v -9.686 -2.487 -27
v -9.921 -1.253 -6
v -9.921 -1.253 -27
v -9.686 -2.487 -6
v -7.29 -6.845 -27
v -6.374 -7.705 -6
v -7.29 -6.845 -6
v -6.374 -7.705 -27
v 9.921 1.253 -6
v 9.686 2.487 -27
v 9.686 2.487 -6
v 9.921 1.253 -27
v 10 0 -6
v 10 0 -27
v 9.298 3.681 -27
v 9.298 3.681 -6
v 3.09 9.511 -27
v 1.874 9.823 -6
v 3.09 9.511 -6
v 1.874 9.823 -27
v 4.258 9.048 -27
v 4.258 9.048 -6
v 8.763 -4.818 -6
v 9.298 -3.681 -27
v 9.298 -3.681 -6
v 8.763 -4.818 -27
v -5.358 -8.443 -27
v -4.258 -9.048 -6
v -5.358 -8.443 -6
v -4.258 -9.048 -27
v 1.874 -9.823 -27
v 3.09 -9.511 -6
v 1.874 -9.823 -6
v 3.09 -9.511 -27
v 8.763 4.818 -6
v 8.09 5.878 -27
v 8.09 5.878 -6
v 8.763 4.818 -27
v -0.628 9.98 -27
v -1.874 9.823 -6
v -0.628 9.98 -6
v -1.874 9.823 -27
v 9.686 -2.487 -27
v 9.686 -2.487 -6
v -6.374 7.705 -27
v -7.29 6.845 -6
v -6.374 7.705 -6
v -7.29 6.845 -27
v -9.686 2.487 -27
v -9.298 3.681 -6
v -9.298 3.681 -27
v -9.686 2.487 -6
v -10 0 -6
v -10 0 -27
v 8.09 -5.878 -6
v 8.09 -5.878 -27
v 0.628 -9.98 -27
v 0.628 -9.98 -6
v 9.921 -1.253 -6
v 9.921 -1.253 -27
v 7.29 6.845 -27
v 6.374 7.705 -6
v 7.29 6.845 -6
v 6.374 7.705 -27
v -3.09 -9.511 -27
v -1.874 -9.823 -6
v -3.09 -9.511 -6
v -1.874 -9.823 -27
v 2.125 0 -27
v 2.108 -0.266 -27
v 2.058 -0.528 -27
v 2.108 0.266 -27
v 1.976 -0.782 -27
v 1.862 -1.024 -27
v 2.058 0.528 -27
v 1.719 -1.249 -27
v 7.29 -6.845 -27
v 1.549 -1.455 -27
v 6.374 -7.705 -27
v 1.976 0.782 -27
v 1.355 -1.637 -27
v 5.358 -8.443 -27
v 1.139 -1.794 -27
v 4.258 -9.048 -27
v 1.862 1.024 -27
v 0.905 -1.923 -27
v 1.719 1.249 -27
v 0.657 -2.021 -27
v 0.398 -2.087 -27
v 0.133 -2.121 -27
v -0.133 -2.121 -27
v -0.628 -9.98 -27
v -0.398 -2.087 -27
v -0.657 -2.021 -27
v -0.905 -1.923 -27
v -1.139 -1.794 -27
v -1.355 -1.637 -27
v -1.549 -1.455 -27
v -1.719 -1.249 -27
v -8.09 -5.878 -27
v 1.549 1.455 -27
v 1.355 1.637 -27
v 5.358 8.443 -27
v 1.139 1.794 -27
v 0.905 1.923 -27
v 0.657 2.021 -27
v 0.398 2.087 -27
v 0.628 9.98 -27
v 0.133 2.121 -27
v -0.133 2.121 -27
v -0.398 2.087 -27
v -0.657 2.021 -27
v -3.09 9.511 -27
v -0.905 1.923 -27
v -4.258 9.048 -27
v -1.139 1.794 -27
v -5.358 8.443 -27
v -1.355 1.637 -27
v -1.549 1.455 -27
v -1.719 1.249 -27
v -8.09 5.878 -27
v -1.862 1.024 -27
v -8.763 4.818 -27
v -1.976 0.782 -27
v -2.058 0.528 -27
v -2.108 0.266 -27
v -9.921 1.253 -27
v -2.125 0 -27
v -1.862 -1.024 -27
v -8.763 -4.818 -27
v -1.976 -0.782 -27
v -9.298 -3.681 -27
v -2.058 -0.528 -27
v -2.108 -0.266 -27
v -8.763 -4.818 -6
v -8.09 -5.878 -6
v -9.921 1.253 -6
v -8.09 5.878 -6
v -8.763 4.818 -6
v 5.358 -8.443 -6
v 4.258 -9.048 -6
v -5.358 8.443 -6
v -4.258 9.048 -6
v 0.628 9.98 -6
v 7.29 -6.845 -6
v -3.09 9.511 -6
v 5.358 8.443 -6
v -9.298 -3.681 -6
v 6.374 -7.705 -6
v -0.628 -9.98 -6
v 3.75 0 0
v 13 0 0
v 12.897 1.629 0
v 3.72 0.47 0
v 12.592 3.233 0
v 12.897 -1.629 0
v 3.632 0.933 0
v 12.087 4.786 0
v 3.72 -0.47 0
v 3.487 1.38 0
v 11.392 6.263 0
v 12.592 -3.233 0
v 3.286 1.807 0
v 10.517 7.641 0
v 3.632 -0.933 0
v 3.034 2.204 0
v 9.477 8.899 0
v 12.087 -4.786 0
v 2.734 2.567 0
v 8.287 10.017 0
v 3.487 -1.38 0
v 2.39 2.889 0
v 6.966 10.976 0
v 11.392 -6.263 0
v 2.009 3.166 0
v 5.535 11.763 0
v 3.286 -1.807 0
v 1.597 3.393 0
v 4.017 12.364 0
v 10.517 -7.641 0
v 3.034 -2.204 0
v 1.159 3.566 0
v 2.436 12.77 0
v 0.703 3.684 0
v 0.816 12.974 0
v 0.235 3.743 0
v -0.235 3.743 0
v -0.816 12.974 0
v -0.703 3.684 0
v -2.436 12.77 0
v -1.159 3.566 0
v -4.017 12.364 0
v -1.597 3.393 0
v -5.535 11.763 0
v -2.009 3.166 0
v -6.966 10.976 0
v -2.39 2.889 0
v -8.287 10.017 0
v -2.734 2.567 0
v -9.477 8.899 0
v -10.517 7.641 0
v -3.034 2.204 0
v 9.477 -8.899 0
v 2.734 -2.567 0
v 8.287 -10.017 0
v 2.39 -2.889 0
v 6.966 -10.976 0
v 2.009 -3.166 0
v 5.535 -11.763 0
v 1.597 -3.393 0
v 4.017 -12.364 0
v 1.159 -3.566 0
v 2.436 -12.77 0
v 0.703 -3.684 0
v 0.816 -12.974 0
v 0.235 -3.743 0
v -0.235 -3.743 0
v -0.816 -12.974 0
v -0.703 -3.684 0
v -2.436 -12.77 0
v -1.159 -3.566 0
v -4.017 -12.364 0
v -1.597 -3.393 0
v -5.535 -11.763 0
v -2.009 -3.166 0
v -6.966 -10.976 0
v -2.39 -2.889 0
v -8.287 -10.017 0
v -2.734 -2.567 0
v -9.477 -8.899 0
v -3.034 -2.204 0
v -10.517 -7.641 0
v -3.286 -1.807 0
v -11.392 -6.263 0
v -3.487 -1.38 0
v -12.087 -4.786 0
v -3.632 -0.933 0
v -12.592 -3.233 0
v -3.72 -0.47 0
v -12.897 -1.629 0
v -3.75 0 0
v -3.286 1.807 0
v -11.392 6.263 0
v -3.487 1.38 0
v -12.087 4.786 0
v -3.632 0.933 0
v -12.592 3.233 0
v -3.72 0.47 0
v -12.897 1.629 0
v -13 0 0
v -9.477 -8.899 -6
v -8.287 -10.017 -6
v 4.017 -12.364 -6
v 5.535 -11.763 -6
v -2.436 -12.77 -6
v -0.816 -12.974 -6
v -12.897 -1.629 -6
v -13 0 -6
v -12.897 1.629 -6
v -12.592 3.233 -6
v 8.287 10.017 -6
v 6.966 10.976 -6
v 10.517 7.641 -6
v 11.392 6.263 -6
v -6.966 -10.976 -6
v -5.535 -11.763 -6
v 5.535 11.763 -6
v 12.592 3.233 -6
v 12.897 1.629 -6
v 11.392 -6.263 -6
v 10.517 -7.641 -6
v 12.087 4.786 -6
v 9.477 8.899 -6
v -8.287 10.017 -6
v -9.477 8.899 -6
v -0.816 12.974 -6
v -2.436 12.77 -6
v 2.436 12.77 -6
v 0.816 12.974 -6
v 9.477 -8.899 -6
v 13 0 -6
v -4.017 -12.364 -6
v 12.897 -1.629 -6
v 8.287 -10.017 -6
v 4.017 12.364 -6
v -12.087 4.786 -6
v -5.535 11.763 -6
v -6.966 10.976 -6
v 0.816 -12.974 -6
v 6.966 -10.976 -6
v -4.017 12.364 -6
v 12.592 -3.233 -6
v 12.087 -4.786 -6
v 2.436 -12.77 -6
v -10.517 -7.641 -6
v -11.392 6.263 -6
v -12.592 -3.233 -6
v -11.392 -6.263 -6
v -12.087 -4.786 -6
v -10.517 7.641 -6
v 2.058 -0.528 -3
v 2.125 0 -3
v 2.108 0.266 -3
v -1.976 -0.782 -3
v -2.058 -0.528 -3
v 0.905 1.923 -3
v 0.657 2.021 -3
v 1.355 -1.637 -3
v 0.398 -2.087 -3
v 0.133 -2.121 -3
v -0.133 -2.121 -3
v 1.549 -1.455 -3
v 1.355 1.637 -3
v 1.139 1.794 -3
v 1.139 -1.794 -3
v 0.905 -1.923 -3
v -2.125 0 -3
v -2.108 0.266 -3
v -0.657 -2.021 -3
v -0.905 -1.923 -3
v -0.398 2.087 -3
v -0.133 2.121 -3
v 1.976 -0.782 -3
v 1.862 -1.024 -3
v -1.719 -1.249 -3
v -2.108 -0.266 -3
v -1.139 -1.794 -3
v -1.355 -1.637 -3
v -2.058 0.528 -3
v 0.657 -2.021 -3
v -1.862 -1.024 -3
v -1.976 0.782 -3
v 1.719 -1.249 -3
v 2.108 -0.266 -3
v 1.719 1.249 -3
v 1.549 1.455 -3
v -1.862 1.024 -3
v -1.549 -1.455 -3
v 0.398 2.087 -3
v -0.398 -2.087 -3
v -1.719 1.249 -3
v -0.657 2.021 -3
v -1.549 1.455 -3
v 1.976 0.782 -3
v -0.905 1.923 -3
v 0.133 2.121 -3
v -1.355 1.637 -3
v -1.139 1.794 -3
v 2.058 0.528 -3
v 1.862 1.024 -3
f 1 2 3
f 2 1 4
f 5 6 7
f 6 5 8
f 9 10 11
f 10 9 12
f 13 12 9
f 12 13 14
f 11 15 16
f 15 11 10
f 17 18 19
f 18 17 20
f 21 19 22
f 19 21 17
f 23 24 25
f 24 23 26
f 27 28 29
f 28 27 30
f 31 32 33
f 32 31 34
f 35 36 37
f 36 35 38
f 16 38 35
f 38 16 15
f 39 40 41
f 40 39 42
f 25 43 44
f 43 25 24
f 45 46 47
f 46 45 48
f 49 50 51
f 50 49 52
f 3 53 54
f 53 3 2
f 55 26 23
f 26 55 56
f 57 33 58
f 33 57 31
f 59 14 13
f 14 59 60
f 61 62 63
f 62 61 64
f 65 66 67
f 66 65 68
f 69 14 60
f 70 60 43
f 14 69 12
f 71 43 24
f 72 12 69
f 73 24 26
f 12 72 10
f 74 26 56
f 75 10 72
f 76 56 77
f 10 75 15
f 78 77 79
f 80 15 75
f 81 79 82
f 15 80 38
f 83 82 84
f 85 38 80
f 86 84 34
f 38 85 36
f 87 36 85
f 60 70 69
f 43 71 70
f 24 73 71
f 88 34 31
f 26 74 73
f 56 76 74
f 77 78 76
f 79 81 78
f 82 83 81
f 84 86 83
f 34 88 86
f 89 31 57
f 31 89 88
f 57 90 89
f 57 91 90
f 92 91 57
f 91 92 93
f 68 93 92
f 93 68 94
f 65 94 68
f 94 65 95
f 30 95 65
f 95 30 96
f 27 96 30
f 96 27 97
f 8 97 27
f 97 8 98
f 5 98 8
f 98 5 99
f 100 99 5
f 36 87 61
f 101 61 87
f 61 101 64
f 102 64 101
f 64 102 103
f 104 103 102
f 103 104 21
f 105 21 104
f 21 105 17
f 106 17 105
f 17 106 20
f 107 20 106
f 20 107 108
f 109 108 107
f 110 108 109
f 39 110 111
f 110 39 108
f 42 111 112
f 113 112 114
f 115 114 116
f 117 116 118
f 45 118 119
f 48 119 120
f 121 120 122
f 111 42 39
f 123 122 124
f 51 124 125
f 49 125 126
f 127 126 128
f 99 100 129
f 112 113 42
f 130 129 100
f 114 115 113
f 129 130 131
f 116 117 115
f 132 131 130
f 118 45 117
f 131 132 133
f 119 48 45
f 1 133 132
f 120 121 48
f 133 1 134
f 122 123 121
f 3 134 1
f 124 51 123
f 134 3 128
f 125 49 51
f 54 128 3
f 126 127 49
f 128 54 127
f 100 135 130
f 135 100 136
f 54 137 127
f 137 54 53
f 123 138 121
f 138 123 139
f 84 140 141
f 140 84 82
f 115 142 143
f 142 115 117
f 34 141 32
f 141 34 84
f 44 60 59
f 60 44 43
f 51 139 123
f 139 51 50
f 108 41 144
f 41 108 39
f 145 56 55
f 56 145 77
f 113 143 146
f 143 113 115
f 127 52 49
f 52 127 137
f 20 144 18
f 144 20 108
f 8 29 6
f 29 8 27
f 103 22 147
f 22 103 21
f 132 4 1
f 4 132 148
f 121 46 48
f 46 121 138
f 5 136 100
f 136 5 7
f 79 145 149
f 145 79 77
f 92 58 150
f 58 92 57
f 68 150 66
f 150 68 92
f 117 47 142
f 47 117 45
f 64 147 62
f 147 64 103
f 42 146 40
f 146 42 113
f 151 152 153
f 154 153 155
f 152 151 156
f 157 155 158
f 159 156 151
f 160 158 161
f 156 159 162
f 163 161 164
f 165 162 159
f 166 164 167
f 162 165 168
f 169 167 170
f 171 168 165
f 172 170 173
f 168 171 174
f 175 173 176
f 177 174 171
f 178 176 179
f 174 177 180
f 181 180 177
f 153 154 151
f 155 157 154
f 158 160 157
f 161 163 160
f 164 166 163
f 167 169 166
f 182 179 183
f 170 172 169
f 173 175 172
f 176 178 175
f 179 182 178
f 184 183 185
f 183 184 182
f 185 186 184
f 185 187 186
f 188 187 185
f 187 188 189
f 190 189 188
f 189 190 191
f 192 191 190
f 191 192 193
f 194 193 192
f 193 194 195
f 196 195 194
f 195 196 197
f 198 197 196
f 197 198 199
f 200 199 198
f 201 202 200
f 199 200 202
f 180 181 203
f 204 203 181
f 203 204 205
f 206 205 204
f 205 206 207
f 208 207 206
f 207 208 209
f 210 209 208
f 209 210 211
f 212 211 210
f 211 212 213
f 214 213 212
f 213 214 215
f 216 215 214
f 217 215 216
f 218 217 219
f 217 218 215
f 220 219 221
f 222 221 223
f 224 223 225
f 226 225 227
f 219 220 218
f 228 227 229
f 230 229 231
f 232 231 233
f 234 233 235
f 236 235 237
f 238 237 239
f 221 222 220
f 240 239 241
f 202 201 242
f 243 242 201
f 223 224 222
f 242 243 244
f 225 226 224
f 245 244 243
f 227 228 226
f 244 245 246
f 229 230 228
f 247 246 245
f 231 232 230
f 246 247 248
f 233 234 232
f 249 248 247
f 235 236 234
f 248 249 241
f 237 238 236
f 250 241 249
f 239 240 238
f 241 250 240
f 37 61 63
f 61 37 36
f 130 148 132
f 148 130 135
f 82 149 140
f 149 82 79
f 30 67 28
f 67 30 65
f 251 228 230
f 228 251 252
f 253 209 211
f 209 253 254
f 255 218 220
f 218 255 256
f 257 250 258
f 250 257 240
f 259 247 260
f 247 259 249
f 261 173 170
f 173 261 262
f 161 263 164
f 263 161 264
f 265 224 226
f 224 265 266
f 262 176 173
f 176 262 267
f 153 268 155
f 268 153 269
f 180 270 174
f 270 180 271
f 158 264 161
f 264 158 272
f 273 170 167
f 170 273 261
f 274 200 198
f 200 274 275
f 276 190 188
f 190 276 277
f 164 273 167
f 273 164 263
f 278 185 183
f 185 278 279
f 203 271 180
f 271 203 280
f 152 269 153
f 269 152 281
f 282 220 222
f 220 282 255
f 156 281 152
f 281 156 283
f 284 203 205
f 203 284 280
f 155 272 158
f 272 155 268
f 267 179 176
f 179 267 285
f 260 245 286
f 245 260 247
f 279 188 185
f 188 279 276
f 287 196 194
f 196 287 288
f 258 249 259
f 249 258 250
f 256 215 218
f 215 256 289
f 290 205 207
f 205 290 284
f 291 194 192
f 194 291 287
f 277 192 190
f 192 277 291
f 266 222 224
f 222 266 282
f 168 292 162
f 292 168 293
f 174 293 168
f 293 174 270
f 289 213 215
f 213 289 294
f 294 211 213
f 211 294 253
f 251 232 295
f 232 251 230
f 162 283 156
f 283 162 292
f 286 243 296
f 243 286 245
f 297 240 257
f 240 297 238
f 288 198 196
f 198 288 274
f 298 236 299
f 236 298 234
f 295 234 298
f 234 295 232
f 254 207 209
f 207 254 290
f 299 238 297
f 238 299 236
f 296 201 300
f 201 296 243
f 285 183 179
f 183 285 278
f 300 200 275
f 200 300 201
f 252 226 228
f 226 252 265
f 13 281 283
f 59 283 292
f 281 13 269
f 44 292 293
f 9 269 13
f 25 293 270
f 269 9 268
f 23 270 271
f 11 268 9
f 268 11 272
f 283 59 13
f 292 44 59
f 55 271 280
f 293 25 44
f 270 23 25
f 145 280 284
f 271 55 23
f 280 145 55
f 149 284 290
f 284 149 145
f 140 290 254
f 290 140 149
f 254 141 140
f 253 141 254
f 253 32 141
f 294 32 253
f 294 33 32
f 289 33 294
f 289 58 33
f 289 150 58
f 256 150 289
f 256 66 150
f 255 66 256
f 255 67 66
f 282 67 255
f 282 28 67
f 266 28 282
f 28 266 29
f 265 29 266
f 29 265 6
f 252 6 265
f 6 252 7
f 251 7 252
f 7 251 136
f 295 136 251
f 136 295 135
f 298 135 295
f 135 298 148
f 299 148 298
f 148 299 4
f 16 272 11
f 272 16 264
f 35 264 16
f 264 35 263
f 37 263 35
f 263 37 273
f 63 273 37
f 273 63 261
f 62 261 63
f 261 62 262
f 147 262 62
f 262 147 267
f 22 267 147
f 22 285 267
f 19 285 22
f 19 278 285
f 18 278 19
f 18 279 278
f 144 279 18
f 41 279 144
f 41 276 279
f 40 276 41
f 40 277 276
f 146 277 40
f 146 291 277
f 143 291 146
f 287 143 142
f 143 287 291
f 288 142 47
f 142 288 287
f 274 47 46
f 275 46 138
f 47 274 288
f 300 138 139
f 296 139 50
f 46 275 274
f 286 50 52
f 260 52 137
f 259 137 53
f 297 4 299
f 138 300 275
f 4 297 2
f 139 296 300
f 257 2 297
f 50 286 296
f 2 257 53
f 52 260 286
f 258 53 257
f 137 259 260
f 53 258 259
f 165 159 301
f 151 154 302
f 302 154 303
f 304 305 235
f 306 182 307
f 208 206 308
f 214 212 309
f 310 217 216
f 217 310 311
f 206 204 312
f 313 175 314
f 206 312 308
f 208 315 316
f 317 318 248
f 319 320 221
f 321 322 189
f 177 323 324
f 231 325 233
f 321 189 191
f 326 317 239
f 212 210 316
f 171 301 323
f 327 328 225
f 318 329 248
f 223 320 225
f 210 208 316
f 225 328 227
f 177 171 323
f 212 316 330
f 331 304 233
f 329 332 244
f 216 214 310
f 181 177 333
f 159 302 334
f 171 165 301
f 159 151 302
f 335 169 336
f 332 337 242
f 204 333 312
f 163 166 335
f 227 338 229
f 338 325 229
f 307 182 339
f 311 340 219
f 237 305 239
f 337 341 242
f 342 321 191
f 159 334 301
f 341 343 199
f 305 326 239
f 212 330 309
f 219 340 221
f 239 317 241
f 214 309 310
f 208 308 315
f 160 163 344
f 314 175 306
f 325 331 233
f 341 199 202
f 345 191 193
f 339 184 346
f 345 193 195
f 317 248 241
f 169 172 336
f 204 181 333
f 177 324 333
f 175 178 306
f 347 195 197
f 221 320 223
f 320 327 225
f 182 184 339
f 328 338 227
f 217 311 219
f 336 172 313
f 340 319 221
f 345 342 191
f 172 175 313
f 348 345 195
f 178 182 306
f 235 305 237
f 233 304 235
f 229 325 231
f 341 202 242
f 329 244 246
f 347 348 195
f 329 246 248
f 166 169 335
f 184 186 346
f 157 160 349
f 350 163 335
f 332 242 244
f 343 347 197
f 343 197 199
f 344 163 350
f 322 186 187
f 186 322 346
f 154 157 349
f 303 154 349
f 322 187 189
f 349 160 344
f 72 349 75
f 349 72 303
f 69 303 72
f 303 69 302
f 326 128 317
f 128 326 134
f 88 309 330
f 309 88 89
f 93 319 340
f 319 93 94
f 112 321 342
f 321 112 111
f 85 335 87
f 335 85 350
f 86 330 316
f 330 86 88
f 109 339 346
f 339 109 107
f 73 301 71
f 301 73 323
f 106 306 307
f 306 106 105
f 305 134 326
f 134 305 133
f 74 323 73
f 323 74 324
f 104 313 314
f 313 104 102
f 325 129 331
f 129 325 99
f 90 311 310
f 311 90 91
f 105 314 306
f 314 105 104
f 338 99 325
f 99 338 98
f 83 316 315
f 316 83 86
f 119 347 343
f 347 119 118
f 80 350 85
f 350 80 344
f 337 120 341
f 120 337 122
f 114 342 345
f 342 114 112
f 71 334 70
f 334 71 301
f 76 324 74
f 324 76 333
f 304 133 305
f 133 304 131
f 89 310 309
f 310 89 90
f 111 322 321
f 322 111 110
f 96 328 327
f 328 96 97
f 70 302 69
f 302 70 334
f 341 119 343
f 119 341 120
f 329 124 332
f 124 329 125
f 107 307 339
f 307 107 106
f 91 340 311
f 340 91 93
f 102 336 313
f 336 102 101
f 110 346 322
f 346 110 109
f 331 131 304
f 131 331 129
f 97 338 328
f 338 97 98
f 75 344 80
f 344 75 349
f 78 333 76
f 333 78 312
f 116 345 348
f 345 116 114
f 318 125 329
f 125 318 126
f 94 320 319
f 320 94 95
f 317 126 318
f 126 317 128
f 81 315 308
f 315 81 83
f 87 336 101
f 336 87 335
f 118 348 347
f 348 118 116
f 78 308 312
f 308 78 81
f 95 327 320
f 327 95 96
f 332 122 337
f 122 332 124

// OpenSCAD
$fn = 50;


difference() {
	union() {
		translate(v = [0, 0, -27.0000000000]) {
			cylinder(h = 27, r = 10.0000000000);
		}
		translate(v = [0, 0, -6.0000000000]) {
			cylinder(h = 6, r = 13.0000000000);
		}
	}
	union() {
		translate(v = [0, 0, 0]) {
			rotate(a = [0, 0, 0]) {
				difference() {
					union() {
						#translate(v = [0, 0, -27.0000000000]) {
							cylinder(h = 27, r = 2.0000000000);
						}
						#translate(v = [0, 0, -3]) {
							cylinder(h = 3, r = 10.0000000000, r1 = 2.1250000000, r2 = 3.7500000000);
						}
						#translate(v = [0, 0, -27.0000000000]) {
							cylinder(h = 27, r = 2.1250000000);
						}
						#translate(v = [0, 0, -27.0000000000]) {
							cylinder(h = 27, r = 2.0000000000);
						}
					}
					union();
				}
			}
		}
	}
}
